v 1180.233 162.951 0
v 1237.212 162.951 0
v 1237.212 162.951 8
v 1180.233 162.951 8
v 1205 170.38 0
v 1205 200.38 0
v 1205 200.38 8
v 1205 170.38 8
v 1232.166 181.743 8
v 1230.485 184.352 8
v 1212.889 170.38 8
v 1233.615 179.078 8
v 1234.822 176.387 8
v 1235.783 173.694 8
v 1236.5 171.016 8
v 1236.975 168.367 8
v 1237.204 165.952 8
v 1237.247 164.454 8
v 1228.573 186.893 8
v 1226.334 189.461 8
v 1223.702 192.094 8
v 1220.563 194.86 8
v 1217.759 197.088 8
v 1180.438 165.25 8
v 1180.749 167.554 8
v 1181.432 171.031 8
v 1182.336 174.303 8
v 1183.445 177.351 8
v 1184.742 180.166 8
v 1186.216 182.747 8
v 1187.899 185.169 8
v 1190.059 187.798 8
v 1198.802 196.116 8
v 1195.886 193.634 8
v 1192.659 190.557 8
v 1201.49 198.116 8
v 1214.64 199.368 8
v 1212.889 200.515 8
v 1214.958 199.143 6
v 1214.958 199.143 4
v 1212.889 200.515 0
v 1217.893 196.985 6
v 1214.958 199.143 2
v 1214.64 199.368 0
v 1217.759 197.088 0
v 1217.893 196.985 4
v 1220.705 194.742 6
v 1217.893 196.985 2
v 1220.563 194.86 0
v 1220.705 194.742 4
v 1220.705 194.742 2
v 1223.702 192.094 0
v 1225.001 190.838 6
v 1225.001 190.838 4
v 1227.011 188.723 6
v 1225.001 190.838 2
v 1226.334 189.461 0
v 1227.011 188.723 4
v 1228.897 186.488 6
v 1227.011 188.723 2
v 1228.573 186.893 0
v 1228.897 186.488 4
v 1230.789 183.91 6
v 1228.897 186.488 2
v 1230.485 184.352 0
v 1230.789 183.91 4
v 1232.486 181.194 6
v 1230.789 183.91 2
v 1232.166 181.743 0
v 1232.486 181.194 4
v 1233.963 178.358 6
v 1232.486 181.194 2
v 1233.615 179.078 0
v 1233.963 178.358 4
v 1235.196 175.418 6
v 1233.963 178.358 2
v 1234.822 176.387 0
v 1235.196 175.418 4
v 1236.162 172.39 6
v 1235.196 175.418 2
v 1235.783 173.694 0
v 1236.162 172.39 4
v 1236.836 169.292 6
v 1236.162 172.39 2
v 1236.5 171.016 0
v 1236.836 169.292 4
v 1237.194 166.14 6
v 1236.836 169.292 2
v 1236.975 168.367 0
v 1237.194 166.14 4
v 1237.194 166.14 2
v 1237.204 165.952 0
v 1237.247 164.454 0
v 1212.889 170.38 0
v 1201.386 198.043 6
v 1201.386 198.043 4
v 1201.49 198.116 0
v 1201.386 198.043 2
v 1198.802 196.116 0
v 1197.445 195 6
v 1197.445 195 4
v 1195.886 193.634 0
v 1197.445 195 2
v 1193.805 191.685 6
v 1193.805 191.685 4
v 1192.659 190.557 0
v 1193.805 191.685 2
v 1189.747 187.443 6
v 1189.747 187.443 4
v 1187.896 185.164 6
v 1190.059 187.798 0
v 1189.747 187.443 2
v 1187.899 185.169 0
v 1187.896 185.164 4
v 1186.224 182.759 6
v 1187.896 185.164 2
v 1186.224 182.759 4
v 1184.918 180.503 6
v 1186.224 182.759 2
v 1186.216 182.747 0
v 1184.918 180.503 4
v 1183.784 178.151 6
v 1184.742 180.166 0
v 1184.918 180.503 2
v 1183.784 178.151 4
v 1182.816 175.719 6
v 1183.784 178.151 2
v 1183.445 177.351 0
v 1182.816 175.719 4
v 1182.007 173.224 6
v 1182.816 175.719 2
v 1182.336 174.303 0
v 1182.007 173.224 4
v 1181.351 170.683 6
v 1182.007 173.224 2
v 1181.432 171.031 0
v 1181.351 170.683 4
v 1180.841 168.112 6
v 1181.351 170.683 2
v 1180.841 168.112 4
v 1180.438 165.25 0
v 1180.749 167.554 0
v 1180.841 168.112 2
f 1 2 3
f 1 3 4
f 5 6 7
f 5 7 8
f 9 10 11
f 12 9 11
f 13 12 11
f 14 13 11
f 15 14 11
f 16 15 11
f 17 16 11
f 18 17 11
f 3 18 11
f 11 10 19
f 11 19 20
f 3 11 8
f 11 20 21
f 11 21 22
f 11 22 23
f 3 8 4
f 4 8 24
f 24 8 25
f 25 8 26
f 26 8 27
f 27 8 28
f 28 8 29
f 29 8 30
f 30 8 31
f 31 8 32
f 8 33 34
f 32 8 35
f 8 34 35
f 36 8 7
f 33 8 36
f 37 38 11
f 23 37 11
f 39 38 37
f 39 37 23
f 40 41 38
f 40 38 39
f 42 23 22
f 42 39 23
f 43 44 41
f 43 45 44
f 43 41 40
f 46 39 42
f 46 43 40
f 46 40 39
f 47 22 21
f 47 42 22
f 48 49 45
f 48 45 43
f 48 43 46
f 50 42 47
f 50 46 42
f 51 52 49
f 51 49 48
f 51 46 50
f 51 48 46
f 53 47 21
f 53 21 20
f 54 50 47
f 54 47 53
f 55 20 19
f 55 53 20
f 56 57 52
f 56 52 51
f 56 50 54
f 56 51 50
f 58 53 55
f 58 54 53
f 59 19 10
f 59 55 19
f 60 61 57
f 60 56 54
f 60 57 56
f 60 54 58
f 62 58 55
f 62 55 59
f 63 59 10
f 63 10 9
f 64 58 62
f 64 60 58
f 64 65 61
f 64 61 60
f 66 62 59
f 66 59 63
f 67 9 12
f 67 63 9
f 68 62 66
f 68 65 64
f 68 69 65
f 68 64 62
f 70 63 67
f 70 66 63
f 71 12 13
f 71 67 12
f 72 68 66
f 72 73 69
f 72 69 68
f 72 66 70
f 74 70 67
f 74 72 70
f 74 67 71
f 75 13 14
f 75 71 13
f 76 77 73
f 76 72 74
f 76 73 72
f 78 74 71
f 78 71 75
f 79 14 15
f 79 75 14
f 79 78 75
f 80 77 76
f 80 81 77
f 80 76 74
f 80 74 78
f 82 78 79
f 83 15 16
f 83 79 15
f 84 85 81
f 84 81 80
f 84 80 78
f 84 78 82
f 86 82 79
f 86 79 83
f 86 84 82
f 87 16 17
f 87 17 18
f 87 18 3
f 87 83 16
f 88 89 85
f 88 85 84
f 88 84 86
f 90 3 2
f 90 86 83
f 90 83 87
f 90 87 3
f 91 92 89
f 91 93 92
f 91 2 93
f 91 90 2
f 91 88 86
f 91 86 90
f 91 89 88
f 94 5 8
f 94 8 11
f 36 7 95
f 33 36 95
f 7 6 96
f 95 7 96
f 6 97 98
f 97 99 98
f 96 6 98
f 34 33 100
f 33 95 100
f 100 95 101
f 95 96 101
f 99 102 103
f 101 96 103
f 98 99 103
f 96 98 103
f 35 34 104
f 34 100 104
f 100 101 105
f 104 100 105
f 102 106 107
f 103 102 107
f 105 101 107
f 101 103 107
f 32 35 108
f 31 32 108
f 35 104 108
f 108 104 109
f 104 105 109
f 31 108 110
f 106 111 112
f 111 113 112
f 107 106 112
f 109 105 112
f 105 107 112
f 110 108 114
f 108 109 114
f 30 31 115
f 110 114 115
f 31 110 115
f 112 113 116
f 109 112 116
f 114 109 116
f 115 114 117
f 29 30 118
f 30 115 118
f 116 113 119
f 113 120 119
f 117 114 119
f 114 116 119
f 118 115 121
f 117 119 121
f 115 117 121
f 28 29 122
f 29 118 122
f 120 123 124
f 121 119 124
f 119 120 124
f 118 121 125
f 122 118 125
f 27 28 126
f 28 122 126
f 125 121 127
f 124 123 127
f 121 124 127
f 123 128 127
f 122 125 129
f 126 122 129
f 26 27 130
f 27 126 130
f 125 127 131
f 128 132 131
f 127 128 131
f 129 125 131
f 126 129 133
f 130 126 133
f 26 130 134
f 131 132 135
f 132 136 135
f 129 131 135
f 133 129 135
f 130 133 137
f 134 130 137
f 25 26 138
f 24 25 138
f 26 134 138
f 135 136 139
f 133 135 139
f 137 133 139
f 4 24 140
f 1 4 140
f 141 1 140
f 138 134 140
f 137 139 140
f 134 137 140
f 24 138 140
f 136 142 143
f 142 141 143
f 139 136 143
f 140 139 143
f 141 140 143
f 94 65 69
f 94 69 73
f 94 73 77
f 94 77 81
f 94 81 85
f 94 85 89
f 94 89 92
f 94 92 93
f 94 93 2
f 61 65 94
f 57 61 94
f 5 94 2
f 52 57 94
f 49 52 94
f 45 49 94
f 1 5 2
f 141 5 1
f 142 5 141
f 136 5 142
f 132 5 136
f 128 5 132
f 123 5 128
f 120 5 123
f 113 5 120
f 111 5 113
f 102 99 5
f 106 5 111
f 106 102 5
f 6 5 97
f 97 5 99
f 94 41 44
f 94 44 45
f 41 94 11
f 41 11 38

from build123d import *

# Parameters (mm, degrees)
EXTRUDE_1_DEPTH = 8


with BuildPart() as part:
    # 草图1 → 凸台-拉伸1 (new body)
    with BuildSketch(Plane.XY):
        with BuildLine():
            Line((1205.000343889, 200.380448257), (1205.000343889, 170.380448257))
            Line((1205.000343889, 170.380448257), (1212.88866118, 170.380448257))
            Line((1212.88866118, 170.380448257), (1212.88866118, 200.514821588))
            add(Edge.make_bspline(
                [(1212.88866118, 200.514821588), (1213.591796404, 200.102674546), (1216.322248426, 198.206599205), (1221.914919676, 193.964391888), (1232.595967144, 183.625439508), (1237.637966356, 171.491478384), (1237.211883134, 162.95060423)],
                knots=[0.038390069, 0.038390069, 0.038390069, 0.038390069, 0.088763706, 0.237953219, 0.477618195, 1, 1, 1, 1], degree=3))
            Line((1237.211883134, 162.95060423), (1180.232585387, 162.95060423))
            add(Edge.make_bspline(
                [(1205.000343889, 200.380448257), (1203.802132525, 199.644141671), (1199.659392578, 197.029571139), (1193.276793905, 191.438907576), (1183.524062882, 180.866285612), (1180.694379897, 169.80625417), (1180.232585387, 162.95060423)],
                knots=[0.038951436, 0.038951436, 0.038951436, 0.038951436, 0.125740292, 0.329523156, 0.570718558, 1, 1, 1, 1], degree=3))
        make_face()
    extrude(amount=EXTRUDE_1_DEPTH)


solid = part.part
